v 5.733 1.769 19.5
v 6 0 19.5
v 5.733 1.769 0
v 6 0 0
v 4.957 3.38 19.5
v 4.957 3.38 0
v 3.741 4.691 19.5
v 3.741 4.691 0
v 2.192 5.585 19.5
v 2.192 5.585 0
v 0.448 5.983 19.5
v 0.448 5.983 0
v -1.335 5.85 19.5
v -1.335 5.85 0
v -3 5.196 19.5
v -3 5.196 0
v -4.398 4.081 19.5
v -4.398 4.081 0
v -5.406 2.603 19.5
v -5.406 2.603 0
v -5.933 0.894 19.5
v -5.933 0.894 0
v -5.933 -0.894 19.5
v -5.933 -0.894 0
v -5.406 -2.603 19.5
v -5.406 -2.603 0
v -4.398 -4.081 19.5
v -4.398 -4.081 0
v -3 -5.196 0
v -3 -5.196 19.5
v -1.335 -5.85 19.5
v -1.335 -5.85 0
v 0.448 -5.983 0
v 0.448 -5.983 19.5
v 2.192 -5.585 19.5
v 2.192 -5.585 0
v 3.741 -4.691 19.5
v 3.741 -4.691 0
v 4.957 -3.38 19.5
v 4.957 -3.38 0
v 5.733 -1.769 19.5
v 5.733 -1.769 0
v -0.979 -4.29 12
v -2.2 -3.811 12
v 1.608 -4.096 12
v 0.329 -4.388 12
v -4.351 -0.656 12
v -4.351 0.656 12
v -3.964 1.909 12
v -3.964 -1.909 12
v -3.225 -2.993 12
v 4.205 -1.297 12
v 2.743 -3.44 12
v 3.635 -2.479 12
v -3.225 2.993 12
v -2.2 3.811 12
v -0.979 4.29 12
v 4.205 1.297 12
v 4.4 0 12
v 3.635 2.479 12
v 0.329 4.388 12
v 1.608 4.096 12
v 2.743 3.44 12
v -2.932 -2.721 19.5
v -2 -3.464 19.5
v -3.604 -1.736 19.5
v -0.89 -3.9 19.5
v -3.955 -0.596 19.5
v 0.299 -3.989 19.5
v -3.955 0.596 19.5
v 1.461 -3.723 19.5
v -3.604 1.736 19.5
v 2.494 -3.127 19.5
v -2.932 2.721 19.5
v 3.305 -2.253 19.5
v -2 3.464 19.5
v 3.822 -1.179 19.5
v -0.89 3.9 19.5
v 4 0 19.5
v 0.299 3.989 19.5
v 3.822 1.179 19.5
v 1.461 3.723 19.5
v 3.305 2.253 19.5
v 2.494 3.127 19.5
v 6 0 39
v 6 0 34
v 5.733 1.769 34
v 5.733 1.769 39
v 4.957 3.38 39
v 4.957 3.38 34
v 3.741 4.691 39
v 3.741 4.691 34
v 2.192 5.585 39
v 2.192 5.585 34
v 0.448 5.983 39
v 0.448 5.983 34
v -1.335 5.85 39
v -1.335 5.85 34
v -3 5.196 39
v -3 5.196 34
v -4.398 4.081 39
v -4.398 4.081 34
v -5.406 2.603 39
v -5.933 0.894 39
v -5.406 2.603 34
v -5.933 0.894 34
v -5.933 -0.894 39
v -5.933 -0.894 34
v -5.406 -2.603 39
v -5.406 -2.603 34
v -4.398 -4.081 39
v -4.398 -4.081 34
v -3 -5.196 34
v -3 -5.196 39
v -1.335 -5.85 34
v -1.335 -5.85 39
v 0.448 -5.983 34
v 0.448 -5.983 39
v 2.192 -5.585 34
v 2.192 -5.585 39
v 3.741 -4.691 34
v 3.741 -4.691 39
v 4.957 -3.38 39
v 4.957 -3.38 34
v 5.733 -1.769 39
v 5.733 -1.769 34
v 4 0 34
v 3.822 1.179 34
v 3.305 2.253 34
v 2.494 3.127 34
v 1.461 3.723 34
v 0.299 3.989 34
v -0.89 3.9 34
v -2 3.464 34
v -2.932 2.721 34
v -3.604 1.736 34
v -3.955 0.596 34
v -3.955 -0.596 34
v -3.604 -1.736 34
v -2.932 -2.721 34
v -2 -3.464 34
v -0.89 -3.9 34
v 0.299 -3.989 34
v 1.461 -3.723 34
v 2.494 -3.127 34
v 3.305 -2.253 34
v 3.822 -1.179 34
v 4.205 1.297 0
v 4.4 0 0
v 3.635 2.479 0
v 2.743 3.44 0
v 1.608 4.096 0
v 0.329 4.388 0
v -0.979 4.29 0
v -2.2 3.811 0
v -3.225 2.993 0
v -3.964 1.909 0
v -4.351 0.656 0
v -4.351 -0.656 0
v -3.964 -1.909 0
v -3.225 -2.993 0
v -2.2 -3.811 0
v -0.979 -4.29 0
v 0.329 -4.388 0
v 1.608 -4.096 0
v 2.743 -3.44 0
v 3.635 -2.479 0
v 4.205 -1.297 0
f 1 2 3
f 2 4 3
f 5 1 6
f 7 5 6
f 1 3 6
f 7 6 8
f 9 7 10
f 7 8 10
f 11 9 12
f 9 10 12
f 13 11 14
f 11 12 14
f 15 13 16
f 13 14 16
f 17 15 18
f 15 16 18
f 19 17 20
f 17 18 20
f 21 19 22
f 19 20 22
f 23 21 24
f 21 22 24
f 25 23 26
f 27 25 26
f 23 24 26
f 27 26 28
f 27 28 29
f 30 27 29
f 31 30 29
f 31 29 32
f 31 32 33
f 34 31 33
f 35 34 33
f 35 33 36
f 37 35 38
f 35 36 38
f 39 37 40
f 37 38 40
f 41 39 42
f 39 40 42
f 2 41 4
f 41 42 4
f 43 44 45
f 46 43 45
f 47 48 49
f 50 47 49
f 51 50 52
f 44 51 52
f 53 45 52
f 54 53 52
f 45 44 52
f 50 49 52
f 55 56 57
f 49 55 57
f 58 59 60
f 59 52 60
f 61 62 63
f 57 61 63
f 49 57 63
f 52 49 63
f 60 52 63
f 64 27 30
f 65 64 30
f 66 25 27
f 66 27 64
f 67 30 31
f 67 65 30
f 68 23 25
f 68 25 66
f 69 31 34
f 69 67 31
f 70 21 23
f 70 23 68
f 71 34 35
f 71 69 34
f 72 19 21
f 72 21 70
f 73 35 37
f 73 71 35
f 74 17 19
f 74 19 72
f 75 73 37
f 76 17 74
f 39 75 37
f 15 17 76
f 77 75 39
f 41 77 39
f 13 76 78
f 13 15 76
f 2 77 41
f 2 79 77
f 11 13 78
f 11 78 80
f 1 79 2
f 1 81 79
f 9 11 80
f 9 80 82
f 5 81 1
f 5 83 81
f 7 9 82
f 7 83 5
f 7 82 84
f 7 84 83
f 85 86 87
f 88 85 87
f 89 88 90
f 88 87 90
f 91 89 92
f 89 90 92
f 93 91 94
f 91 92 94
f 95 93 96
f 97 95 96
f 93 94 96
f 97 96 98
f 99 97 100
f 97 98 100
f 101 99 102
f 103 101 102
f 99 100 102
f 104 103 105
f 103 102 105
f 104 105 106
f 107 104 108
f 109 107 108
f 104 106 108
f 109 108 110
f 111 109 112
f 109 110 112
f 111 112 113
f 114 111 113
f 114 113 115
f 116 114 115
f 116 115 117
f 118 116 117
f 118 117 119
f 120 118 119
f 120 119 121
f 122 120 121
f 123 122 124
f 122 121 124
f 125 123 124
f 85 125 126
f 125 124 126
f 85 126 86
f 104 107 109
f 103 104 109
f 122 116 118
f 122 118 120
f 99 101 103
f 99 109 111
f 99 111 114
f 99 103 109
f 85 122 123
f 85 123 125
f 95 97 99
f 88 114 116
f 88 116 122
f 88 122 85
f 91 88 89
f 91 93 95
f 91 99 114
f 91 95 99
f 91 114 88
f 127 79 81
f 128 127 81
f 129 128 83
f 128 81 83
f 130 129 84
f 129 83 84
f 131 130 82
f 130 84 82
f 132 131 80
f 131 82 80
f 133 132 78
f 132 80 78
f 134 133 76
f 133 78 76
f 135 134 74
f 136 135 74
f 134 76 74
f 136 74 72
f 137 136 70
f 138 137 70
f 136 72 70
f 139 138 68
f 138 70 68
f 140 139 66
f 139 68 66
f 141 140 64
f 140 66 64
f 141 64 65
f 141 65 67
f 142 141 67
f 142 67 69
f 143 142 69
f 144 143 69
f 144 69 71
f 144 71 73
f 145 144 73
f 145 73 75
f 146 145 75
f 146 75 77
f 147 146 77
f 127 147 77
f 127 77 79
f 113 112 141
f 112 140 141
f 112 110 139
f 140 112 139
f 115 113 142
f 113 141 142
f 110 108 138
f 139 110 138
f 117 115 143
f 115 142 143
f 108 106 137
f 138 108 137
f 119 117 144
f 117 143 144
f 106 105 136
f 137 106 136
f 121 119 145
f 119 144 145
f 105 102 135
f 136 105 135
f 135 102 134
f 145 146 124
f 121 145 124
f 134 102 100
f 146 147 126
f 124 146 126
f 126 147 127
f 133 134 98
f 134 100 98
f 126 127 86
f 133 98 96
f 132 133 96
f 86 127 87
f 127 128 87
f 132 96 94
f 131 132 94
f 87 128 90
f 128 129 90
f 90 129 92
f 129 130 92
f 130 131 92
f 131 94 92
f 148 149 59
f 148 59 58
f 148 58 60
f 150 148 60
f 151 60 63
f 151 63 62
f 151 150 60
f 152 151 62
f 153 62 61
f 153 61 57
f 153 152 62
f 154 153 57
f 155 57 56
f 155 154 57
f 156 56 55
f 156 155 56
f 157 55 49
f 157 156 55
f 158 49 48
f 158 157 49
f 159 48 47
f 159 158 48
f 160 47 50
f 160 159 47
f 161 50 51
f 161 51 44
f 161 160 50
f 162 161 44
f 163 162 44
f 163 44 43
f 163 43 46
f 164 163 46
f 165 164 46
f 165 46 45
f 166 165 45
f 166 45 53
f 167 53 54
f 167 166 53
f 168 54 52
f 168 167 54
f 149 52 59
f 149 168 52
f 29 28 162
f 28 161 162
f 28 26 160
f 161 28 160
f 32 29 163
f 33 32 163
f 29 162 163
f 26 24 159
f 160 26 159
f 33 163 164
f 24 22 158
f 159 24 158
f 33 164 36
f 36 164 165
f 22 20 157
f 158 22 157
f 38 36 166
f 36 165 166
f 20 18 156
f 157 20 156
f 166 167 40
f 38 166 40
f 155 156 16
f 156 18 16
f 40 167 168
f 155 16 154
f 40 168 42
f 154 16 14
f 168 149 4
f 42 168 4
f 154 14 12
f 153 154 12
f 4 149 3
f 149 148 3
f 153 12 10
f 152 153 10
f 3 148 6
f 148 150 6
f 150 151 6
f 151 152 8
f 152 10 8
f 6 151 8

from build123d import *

# Parameters (mm, degrees)
SKETCH1_R           = 6
SKETCH1_R_2         = 4.4
BOSS_EXTRUDE1_DEPTH = 12
SKETCH2_R           = 6
BOSS_EXTRUDE2_DEPTH = 2
SKETCH3_R           = 4
BOSS_EXTRUDE3_DEPTH = 20
SKETCH4_R           = 6
BOSS_EXTRUDE4_DEPTH = 5
SKETCH5_R           = 6
BOSS_EXTRUDE5_DEPTH = 5.5


with BuildPart() as part:
    # Sketch1 → Boss-Extrude1 (new body)
    with BuildSketch(Plane.XY):
        Circle(SKETCH1_R)
        Circle(SKETCH1_R_2, mode=Mode.SUBTRACT)
    extrude(amount=BOSS_EXTRUDE1_DEPTH)

    # Sketch2 → Boss-Extrude2 (add)
    with BuildSketch(Plane.XY.offset(12)):
        Circle(SKETCH2_R)
    extrude(amount=BOSS_EXTRUDE2_DEPTH)

    # Sketch3 → Boss-Extrude3 (add)
    with BuildSketch(Plane.XY.offset(14)):
        Circle(SKETCH3_R)
    extrude(amount=BOSS_EXTRUDE3_DEPTH)

    # Sketch4 → Boss-Extrude4 (add)
    with BuildSketch(Plane.XY.offset(34)):
        Circle(SKETCH4_R)
    extrude(amount=BOSS_EXTRUDE4_DEPTH)

    # Sketch5 → Boss-Extrude5 (add)
    with BuildSketch(Plane.XY.offset(14)):
        Circle(SKETCH5_R)
    extrude(amount=BOSS_EXTRUDE5_DEPTH)


solid = part.part
